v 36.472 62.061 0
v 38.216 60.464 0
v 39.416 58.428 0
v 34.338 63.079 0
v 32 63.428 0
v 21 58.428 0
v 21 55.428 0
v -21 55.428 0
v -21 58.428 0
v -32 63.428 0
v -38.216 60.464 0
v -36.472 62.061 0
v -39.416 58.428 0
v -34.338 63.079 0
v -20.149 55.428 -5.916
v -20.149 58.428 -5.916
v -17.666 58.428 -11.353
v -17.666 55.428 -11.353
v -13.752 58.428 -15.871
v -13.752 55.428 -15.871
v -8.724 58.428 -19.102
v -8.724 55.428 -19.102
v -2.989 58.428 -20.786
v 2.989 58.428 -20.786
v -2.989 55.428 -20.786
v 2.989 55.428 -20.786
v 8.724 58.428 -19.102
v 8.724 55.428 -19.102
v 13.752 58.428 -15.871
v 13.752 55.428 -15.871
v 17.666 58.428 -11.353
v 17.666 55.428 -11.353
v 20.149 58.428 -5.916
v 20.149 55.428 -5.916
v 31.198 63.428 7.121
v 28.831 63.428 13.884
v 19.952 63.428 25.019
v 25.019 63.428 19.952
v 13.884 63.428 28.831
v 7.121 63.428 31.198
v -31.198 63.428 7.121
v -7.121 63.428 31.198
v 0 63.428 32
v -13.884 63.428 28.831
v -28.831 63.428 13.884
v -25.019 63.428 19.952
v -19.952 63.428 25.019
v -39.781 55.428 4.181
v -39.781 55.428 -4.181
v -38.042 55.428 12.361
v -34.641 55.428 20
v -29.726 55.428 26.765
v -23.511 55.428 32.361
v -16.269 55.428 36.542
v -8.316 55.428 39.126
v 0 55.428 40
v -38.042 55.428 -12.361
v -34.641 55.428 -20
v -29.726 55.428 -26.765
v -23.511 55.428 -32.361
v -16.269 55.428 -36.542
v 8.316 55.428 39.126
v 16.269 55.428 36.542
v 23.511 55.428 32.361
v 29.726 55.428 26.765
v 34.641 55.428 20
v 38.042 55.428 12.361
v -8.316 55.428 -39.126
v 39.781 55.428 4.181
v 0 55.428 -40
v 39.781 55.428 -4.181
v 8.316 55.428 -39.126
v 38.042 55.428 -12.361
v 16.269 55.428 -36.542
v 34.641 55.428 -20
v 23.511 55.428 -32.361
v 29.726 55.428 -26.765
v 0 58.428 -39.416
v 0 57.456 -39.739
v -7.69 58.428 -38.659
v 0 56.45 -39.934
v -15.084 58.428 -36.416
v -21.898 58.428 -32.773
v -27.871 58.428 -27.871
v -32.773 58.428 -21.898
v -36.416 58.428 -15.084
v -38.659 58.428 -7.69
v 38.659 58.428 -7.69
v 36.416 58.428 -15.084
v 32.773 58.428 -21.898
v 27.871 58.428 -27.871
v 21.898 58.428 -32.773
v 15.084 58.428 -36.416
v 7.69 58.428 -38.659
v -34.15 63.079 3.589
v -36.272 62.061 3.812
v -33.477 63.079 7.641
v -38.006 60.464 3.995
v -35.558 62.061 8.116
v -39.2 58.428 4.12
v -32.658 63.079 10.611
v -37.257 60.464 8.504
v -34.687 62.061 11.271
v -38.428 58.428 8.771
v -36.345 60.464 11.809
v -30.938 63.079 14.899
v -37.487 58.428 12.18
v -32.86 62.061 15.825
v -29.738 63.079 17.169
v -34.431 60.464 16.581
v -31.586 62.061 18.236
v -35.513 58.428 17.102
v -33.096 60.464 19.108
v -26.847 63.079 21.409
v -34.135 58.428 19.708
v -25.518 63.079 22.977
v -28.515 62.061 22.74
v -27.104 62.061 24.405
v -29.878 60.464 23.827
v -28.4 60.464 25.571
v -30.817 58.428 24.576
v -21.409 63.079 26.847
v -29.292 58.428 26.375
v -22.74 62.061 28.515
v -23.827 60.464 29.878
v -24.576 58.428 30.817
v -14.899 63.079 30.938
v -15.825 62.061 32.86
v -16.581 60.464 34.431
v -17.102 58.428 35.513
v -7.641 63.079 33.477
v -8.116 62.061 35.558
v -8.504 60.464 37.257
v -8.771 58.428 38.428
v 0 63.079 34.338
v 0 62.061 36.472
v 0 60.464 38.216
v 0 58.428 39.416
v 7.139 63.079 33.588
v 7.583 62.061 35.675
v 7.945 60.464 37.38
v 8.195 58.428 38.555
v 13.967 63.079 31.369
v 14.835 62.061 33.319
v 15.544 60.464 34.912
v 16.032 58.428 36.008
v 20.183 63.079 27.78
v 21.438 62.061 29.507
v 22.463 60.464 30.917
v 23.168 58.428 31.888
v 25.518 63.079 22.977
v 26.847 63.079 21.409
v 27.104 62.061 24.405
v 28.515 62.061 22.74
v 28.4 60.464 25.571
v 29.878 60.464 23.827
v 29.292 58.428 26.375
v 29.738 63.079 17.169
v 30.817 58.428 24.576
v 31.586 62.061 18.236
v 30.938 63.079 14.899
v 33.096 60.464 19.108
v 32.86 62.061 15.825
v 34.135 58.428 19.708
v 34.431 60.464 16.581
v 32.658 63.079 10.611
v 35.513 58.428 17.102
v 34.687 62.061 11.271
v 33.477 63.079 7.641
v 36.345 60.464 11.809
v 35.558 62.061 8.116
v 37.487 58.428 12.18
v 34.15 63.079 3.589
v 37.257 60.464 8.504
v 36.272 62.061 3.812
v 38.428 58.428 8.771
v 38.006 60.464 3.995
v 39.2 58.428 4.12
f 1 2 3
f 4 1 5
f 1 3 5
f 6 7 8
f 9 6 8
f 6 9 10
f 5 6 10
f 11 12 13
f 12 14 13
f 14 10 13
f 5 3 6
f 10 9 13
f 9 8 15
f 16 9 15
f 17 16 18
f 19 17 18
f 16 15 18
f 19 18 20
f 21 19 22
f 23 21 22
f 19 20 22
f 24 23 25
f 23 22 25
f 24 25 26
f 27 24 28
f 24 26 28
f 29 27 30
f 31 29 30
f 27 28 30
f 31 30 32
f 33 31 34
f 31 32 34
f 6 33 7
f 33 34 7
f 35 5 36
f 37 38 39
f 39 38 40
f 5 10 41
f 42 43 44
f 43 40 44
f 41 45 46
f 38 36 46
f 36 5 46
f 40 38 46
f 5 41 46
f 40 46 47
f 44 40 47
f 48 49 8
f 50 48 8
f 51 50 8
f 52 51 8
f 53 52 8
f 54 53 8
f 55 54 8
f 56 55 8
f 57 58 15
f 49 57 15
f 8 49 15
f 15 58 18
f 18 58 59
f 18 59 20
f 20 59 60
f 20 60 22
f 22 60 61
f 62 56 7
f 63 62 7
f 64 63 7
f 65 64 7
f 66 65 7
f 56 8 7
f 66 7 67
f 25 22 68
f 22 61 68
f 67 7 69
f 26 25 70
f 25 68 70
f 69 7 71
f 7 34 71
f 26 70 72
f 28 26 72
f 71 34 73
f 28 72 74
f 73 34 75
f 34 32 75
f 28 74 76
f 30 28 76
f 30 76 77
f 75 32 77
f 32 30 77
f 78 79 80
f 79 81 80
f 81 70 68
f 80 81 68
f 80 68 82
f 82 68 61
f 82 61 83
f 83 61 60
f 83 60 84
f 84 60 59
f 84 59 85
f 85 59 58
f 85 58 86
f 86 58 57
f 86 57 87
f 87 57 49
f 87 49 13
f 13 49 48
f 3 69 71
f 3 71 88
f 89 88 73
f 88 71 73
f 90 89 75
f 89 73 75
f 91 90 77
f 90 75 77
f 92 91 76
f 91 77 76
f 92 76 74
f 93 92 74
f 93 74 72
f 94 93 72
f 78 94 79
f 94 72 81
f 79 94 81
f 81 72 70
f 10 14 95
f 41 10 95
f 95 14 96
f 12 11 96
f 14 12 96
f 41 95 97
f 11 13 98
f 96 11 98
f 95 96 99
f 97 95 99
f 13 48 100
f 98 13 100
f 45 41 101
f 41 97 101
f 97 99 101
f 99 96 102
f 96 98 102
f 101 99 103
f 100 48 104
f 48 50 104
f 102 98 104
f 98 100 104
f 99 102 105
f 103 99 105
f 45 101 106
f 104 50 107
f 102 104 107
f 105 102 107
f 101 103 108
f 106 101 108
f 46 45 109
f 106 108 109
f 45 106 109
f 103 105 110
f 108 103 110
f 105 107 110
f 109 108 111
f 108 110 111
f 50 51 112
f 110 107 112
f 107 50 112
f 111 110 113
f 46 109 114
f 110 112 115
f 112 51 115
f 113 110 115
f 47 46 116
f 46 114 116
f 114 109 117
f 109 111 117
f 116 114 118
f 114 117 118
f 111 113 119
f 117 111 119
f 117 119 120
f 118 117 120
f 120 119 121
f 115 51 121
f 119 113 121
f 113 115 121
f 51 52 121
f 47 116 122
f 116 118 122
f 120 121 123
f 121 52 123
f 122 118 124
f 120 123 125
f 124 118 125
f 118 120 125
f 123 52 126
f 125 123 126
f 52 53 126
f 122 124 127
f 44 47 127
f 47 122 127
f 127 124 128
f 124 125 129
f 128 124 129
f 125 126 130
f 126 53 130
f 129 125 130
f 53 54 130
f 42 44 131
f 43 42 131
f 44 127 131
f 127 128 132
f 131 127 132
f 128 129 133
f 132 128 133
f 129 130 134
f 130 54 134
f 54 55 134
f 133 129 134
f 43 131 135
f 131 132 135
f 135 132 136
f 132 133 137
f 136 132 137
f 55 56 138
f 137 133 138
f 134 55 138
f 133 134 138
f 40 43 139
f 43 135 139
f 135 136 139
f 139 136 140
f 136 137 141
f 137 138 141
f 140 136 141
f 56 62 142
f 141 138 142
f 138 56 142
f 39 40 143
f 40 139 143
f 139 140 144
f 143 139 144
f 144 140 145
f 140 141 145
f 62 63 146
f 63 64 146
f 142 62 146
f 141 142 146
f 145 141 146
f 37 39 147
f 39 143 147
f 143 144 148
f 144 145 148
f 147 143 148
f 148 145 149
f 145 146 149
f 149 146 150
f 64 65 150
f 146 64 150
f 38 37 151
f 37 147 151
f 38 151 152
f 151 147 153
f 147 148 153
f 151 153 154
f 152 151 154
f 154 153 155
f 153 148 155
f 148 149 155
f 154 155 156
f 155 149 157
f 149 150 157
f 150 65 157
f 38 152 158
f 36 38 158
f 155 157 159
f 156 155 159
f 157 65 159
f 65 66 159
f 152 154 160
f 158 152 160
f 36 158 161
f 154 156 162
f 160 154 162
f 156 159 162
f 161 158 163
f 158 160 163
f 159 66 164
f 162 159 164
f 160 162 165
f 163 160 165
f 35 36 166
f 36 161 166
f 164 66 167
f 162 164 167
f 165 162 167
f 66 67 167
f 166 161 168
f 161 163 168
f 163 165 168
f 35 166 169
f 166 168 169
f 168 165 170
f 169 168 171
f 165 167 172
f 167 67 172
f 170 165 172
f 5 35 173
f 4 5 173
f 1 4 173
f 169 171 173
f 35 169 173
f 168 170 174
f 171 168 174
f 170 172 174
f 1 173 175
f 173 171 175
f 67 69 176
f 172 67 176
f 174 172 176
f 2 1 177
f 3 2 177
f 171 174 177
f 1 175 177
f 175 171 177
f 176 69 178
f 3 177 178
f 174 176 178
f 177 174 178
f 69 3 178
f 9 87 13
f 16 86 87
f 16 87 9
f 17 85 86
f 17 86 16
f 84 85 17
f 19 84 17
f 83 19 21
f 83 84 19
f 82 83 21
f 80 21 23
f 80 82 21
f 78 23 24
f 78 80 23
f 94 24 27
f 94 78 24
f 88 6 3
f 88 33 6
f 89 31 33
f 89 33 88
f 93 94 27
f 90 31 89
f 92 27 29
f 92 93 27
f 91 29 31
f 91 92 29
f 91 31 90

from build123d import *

# Parameters (mm, degrees)
CUT_EXTRUDE3_DEPTH           = 60
CUT_EXTRUDE5_DEPTH           = 2
CUT_EXTRUDE5_DEPTH_BACK      = 30
SKETCH19_W                   = 12
SKETCH19_H                   = 36.5
CUT_REVOLVE2_ANGLE           = 65
CUT_REVOLVE2_OTHER_WAY_ANGLE = 65
SKETCH21_W                   = 3.25
SKETCH21_H                   = 4
BOSS_EXTRUDE3_DEPTH          = 1.35
CIRPATTERN1_COUNT            = 5
CUT_EXTRUDE9_START           = -5
CUT_EXTRUDE9_DEPTH           = 5
INTERSECT1_DEPTH             = 55.427876097
INTERSECT1_START             = 55.427876097
INTERSECT1_2_OUTLINE_R       = 37.002145429
INTERSECT1_2_DEPTH           = 2


# Read off the part's stored shape, not the designer's step: Cut-Extrude9, Intersect1
with BuildPart() as part:
    # Sketch1 → Revolve1 (revolve)
    with BuildSketch(Plane.XY, mode=Mode.PRIVATE) as revolve1_sk:
        with BuildLine():
            Line((0, 63.427876097), (32, 63.427876097))
            ThreePointArc((32, 63.427876097), (37.656854249, 61.084730346), (40, 55.427876097))
            Line((40, 55.427876097), (40, 31.556288966))
            ThreePointArc((40, 31.556288966), (38.188122658, 24.409721904), (33.190210564, 18.989648567))
            Line((33.190210564, 18.989648567), (28.539859624, 15.958818353))
            ThreePointArc((28.539859624, 15.958818353), (25.207918228, 12.345436129), (24, 7.581058088))
            Line((24, 7.581058088), (24, 3.25))
            Line((24, 3.25), (24.35, 3))
            Line((24.35, 3), (24.35, 0))
            Line((24.35, 0), (22.5, 0))
            Line((22.5, 0), (22.5, 12.5))
            ThreePointArc((22.5, 12.5), (22.353553391, 12.853553391), (22, 13))
            Line((22, 13), (0, 13))
            Line((0, 13), (0, 63.427876097))
        make_face()
    revolve(revolve1_sk.sketch.rotate(Axis((0, 0, 0), (0, 1, 0)), 90), axis=Axis((0, 0, 0), (0, 1, 0)))

    # Sketch11 → Cut-Extrude3 (cut)
    with BuildSketch(Plane(origin=(0, 13, 0), x_dir=(-1, 0, 0), z_dir=(0, -1, 0))):
        with BuildLine():
            Line((-21, 0), (21, 0))
            ThreePointArc((21, 0), (0, 21), (-21, 0))
        make_face()
    extrude(amount=-CUT_EXTRUDE3_DEPTH, mode=Mode.SUBTRACT)

    # Sketch9 → Cut-Extrude5 (cut, two sides: drawn at the far end of the back side and taken through both)
    with BuildSketch(Plane(origin=(0, 55.427876097, 0), x_dir=(1, 0, 0), z_dir=(0, 1, 0)).offset(-CUT_EXTRUDE5_DEPTH_BACK)):
        with BuildLine():
            ThreePointArc((-37, -1.601545046), (-0.398454954, -39), (37, -2.398454954))
            ThreePointArc((37, -2.398454954), (0.398454954, 35), (-37, -1.601545046))
        make_face()
        with BuildLine():
            Line((-24, -1.763080838), (24, -1.763080838))
            ThreePointArc((24, -1.763080838), (0, 24), (-24, -1.763080838))
        make_face(mode=Mode.SUBTRACT)
    extrude(amount=CUT_EXTRUDE5_DEPTH + CUT_EXTRUDE5_DEPTH_BACK, mode=Mode.SUBTRACT)

    # Sketch19 → Cut-Revolve2 (revolve, cut)
    with BuildSketch(Plane(origin=(0, 0, 0), x_dir=(0, 0, -1), z_dir=(1, 0, 0))):
        with Locations((-41.064715832, 37.177876097)):
            Rectangle(SKETCH19_W, SKETCH19_H)
    revolve(axis=Axis((0, 0, 0), (0, 1, 0)), revolution_arc=CUT_REVOLVE2_ANGLE, mode=Mode.SUBTRACT)

    # Sketch19 → Cut-Revolve2 other way (revolve, cut)
    with BuildSketch(Plane(origin=(0, 0, 0), x_dir=(0, 0, -1), z_dir=(1, 0, 0))):
        with Locations((-41.064715832, 37.177876097)):
            Rectangle(SKETCH19_W, SKETCH19_H)
    revolve(axis=Axis((0, 0, 0), (0, -1, 0)), revolution_arc=CUT_REVOLVE2_OTHER_WAY_ANGLE, mode=Mode.SUBTRACT)

    # Sketch21 → Boss-Extrude3 (add)
    with BuildSketch(Plane(origin=(0, 0, 22.5), x_dir=(-1, 0, 0), z_dir=(0, 0, -1))):
        with Locations((0, 2)):
            Rectangle(SKETCH21_W, SKETCH21_H)
    boss_extrude3 = extrude(amount=BOSS_EXTRUDE3_DEPTH)

    # CirPattern1: Boss-Extrude3 ×5 about axis
    cirpattern1_axis = Axis((0, 0, 0), (0, 1, 0))
    for i in range(1, CIRPATTERN1_COUNT):
        add(boss_extrude3.rotate(cirpattern1_axis, i * 360 / CIRPATTERN1_COUNT))

    # Cut-Extrude9 outline → Cut-Extrude9 (cut)
    with BuildSketch(Plane(origin=(0, 63.427876097, 0), x_dir=(1, 0, 0), z_dir=(0, 1, 0)).offset(CUT_EXTRUDE9_START)):
        with BuildLine():
            ThreePointArc((40, 0), (0, 40), (-40, 0))
            Line((-40, 0), (-21, 0))
            ThreePointArc((-21, 0), (0, 21), (21, 0))
            Line((21, 0), (40, 0))
        make_face()
    extrude(amount=CUT_EXTRUDE9_DEPTH, mode=Mode.SUBTRACT)

    # Intersect1 outline → Intersect1 (cut)
    with BuildSketch(Plane(origin=(0, 0, 0), x_dir=(1, 0, 0), z_dir=(0, 1, 0))):
        with BuildLine():
            Line((31.779425009, -14.818989253), (36.252311481, -16.90473047))
            ThreePointArc((36.252311481, -16.90473047), (0, 40), (-36.252311481, -16.90473047))
            Line((-36.252311481, -16.90473047), (-31.779425009, -14.818989253))
            ThreePointArc((-31.779425009, -14.818989253), (0, -35.064715832), (31.779425009, -14.818989253))
        make_face()
        with BuildLine():
            ThreePointArc((-21, 0), (0, 21), (21, 0))
            Line((21, 0), (-21, 0))
        make_face(mode=Mode.SUBTRACT)
    extrude(amount=INTERSECT1_DEPTH, mode=Mode.SUBTRACT)

    # Intersect1 2 outline → Intersect1 2 (add)
    with BuildSketch(Plane(origin=(0, 0, 0), x_dir=(1, 0, 0), z_dir=(0, 1, 0)).offset(INTERSECT1_START)):
        with Locations((0, -2)):
            Circle(INTERSECT1_2_OUTLINE_R)
        with BuildLine():
            ThreePointArc((-24, -1.763080838), (0, 24), (24, -1.763080838))
            Line((24, -1.763080838), (-24, -1.763080838))
        make_face(mode=Mode.SUBTRACT)
    extrude(amount=INTERSECT1_2_DEPTH)


solid = part.part
